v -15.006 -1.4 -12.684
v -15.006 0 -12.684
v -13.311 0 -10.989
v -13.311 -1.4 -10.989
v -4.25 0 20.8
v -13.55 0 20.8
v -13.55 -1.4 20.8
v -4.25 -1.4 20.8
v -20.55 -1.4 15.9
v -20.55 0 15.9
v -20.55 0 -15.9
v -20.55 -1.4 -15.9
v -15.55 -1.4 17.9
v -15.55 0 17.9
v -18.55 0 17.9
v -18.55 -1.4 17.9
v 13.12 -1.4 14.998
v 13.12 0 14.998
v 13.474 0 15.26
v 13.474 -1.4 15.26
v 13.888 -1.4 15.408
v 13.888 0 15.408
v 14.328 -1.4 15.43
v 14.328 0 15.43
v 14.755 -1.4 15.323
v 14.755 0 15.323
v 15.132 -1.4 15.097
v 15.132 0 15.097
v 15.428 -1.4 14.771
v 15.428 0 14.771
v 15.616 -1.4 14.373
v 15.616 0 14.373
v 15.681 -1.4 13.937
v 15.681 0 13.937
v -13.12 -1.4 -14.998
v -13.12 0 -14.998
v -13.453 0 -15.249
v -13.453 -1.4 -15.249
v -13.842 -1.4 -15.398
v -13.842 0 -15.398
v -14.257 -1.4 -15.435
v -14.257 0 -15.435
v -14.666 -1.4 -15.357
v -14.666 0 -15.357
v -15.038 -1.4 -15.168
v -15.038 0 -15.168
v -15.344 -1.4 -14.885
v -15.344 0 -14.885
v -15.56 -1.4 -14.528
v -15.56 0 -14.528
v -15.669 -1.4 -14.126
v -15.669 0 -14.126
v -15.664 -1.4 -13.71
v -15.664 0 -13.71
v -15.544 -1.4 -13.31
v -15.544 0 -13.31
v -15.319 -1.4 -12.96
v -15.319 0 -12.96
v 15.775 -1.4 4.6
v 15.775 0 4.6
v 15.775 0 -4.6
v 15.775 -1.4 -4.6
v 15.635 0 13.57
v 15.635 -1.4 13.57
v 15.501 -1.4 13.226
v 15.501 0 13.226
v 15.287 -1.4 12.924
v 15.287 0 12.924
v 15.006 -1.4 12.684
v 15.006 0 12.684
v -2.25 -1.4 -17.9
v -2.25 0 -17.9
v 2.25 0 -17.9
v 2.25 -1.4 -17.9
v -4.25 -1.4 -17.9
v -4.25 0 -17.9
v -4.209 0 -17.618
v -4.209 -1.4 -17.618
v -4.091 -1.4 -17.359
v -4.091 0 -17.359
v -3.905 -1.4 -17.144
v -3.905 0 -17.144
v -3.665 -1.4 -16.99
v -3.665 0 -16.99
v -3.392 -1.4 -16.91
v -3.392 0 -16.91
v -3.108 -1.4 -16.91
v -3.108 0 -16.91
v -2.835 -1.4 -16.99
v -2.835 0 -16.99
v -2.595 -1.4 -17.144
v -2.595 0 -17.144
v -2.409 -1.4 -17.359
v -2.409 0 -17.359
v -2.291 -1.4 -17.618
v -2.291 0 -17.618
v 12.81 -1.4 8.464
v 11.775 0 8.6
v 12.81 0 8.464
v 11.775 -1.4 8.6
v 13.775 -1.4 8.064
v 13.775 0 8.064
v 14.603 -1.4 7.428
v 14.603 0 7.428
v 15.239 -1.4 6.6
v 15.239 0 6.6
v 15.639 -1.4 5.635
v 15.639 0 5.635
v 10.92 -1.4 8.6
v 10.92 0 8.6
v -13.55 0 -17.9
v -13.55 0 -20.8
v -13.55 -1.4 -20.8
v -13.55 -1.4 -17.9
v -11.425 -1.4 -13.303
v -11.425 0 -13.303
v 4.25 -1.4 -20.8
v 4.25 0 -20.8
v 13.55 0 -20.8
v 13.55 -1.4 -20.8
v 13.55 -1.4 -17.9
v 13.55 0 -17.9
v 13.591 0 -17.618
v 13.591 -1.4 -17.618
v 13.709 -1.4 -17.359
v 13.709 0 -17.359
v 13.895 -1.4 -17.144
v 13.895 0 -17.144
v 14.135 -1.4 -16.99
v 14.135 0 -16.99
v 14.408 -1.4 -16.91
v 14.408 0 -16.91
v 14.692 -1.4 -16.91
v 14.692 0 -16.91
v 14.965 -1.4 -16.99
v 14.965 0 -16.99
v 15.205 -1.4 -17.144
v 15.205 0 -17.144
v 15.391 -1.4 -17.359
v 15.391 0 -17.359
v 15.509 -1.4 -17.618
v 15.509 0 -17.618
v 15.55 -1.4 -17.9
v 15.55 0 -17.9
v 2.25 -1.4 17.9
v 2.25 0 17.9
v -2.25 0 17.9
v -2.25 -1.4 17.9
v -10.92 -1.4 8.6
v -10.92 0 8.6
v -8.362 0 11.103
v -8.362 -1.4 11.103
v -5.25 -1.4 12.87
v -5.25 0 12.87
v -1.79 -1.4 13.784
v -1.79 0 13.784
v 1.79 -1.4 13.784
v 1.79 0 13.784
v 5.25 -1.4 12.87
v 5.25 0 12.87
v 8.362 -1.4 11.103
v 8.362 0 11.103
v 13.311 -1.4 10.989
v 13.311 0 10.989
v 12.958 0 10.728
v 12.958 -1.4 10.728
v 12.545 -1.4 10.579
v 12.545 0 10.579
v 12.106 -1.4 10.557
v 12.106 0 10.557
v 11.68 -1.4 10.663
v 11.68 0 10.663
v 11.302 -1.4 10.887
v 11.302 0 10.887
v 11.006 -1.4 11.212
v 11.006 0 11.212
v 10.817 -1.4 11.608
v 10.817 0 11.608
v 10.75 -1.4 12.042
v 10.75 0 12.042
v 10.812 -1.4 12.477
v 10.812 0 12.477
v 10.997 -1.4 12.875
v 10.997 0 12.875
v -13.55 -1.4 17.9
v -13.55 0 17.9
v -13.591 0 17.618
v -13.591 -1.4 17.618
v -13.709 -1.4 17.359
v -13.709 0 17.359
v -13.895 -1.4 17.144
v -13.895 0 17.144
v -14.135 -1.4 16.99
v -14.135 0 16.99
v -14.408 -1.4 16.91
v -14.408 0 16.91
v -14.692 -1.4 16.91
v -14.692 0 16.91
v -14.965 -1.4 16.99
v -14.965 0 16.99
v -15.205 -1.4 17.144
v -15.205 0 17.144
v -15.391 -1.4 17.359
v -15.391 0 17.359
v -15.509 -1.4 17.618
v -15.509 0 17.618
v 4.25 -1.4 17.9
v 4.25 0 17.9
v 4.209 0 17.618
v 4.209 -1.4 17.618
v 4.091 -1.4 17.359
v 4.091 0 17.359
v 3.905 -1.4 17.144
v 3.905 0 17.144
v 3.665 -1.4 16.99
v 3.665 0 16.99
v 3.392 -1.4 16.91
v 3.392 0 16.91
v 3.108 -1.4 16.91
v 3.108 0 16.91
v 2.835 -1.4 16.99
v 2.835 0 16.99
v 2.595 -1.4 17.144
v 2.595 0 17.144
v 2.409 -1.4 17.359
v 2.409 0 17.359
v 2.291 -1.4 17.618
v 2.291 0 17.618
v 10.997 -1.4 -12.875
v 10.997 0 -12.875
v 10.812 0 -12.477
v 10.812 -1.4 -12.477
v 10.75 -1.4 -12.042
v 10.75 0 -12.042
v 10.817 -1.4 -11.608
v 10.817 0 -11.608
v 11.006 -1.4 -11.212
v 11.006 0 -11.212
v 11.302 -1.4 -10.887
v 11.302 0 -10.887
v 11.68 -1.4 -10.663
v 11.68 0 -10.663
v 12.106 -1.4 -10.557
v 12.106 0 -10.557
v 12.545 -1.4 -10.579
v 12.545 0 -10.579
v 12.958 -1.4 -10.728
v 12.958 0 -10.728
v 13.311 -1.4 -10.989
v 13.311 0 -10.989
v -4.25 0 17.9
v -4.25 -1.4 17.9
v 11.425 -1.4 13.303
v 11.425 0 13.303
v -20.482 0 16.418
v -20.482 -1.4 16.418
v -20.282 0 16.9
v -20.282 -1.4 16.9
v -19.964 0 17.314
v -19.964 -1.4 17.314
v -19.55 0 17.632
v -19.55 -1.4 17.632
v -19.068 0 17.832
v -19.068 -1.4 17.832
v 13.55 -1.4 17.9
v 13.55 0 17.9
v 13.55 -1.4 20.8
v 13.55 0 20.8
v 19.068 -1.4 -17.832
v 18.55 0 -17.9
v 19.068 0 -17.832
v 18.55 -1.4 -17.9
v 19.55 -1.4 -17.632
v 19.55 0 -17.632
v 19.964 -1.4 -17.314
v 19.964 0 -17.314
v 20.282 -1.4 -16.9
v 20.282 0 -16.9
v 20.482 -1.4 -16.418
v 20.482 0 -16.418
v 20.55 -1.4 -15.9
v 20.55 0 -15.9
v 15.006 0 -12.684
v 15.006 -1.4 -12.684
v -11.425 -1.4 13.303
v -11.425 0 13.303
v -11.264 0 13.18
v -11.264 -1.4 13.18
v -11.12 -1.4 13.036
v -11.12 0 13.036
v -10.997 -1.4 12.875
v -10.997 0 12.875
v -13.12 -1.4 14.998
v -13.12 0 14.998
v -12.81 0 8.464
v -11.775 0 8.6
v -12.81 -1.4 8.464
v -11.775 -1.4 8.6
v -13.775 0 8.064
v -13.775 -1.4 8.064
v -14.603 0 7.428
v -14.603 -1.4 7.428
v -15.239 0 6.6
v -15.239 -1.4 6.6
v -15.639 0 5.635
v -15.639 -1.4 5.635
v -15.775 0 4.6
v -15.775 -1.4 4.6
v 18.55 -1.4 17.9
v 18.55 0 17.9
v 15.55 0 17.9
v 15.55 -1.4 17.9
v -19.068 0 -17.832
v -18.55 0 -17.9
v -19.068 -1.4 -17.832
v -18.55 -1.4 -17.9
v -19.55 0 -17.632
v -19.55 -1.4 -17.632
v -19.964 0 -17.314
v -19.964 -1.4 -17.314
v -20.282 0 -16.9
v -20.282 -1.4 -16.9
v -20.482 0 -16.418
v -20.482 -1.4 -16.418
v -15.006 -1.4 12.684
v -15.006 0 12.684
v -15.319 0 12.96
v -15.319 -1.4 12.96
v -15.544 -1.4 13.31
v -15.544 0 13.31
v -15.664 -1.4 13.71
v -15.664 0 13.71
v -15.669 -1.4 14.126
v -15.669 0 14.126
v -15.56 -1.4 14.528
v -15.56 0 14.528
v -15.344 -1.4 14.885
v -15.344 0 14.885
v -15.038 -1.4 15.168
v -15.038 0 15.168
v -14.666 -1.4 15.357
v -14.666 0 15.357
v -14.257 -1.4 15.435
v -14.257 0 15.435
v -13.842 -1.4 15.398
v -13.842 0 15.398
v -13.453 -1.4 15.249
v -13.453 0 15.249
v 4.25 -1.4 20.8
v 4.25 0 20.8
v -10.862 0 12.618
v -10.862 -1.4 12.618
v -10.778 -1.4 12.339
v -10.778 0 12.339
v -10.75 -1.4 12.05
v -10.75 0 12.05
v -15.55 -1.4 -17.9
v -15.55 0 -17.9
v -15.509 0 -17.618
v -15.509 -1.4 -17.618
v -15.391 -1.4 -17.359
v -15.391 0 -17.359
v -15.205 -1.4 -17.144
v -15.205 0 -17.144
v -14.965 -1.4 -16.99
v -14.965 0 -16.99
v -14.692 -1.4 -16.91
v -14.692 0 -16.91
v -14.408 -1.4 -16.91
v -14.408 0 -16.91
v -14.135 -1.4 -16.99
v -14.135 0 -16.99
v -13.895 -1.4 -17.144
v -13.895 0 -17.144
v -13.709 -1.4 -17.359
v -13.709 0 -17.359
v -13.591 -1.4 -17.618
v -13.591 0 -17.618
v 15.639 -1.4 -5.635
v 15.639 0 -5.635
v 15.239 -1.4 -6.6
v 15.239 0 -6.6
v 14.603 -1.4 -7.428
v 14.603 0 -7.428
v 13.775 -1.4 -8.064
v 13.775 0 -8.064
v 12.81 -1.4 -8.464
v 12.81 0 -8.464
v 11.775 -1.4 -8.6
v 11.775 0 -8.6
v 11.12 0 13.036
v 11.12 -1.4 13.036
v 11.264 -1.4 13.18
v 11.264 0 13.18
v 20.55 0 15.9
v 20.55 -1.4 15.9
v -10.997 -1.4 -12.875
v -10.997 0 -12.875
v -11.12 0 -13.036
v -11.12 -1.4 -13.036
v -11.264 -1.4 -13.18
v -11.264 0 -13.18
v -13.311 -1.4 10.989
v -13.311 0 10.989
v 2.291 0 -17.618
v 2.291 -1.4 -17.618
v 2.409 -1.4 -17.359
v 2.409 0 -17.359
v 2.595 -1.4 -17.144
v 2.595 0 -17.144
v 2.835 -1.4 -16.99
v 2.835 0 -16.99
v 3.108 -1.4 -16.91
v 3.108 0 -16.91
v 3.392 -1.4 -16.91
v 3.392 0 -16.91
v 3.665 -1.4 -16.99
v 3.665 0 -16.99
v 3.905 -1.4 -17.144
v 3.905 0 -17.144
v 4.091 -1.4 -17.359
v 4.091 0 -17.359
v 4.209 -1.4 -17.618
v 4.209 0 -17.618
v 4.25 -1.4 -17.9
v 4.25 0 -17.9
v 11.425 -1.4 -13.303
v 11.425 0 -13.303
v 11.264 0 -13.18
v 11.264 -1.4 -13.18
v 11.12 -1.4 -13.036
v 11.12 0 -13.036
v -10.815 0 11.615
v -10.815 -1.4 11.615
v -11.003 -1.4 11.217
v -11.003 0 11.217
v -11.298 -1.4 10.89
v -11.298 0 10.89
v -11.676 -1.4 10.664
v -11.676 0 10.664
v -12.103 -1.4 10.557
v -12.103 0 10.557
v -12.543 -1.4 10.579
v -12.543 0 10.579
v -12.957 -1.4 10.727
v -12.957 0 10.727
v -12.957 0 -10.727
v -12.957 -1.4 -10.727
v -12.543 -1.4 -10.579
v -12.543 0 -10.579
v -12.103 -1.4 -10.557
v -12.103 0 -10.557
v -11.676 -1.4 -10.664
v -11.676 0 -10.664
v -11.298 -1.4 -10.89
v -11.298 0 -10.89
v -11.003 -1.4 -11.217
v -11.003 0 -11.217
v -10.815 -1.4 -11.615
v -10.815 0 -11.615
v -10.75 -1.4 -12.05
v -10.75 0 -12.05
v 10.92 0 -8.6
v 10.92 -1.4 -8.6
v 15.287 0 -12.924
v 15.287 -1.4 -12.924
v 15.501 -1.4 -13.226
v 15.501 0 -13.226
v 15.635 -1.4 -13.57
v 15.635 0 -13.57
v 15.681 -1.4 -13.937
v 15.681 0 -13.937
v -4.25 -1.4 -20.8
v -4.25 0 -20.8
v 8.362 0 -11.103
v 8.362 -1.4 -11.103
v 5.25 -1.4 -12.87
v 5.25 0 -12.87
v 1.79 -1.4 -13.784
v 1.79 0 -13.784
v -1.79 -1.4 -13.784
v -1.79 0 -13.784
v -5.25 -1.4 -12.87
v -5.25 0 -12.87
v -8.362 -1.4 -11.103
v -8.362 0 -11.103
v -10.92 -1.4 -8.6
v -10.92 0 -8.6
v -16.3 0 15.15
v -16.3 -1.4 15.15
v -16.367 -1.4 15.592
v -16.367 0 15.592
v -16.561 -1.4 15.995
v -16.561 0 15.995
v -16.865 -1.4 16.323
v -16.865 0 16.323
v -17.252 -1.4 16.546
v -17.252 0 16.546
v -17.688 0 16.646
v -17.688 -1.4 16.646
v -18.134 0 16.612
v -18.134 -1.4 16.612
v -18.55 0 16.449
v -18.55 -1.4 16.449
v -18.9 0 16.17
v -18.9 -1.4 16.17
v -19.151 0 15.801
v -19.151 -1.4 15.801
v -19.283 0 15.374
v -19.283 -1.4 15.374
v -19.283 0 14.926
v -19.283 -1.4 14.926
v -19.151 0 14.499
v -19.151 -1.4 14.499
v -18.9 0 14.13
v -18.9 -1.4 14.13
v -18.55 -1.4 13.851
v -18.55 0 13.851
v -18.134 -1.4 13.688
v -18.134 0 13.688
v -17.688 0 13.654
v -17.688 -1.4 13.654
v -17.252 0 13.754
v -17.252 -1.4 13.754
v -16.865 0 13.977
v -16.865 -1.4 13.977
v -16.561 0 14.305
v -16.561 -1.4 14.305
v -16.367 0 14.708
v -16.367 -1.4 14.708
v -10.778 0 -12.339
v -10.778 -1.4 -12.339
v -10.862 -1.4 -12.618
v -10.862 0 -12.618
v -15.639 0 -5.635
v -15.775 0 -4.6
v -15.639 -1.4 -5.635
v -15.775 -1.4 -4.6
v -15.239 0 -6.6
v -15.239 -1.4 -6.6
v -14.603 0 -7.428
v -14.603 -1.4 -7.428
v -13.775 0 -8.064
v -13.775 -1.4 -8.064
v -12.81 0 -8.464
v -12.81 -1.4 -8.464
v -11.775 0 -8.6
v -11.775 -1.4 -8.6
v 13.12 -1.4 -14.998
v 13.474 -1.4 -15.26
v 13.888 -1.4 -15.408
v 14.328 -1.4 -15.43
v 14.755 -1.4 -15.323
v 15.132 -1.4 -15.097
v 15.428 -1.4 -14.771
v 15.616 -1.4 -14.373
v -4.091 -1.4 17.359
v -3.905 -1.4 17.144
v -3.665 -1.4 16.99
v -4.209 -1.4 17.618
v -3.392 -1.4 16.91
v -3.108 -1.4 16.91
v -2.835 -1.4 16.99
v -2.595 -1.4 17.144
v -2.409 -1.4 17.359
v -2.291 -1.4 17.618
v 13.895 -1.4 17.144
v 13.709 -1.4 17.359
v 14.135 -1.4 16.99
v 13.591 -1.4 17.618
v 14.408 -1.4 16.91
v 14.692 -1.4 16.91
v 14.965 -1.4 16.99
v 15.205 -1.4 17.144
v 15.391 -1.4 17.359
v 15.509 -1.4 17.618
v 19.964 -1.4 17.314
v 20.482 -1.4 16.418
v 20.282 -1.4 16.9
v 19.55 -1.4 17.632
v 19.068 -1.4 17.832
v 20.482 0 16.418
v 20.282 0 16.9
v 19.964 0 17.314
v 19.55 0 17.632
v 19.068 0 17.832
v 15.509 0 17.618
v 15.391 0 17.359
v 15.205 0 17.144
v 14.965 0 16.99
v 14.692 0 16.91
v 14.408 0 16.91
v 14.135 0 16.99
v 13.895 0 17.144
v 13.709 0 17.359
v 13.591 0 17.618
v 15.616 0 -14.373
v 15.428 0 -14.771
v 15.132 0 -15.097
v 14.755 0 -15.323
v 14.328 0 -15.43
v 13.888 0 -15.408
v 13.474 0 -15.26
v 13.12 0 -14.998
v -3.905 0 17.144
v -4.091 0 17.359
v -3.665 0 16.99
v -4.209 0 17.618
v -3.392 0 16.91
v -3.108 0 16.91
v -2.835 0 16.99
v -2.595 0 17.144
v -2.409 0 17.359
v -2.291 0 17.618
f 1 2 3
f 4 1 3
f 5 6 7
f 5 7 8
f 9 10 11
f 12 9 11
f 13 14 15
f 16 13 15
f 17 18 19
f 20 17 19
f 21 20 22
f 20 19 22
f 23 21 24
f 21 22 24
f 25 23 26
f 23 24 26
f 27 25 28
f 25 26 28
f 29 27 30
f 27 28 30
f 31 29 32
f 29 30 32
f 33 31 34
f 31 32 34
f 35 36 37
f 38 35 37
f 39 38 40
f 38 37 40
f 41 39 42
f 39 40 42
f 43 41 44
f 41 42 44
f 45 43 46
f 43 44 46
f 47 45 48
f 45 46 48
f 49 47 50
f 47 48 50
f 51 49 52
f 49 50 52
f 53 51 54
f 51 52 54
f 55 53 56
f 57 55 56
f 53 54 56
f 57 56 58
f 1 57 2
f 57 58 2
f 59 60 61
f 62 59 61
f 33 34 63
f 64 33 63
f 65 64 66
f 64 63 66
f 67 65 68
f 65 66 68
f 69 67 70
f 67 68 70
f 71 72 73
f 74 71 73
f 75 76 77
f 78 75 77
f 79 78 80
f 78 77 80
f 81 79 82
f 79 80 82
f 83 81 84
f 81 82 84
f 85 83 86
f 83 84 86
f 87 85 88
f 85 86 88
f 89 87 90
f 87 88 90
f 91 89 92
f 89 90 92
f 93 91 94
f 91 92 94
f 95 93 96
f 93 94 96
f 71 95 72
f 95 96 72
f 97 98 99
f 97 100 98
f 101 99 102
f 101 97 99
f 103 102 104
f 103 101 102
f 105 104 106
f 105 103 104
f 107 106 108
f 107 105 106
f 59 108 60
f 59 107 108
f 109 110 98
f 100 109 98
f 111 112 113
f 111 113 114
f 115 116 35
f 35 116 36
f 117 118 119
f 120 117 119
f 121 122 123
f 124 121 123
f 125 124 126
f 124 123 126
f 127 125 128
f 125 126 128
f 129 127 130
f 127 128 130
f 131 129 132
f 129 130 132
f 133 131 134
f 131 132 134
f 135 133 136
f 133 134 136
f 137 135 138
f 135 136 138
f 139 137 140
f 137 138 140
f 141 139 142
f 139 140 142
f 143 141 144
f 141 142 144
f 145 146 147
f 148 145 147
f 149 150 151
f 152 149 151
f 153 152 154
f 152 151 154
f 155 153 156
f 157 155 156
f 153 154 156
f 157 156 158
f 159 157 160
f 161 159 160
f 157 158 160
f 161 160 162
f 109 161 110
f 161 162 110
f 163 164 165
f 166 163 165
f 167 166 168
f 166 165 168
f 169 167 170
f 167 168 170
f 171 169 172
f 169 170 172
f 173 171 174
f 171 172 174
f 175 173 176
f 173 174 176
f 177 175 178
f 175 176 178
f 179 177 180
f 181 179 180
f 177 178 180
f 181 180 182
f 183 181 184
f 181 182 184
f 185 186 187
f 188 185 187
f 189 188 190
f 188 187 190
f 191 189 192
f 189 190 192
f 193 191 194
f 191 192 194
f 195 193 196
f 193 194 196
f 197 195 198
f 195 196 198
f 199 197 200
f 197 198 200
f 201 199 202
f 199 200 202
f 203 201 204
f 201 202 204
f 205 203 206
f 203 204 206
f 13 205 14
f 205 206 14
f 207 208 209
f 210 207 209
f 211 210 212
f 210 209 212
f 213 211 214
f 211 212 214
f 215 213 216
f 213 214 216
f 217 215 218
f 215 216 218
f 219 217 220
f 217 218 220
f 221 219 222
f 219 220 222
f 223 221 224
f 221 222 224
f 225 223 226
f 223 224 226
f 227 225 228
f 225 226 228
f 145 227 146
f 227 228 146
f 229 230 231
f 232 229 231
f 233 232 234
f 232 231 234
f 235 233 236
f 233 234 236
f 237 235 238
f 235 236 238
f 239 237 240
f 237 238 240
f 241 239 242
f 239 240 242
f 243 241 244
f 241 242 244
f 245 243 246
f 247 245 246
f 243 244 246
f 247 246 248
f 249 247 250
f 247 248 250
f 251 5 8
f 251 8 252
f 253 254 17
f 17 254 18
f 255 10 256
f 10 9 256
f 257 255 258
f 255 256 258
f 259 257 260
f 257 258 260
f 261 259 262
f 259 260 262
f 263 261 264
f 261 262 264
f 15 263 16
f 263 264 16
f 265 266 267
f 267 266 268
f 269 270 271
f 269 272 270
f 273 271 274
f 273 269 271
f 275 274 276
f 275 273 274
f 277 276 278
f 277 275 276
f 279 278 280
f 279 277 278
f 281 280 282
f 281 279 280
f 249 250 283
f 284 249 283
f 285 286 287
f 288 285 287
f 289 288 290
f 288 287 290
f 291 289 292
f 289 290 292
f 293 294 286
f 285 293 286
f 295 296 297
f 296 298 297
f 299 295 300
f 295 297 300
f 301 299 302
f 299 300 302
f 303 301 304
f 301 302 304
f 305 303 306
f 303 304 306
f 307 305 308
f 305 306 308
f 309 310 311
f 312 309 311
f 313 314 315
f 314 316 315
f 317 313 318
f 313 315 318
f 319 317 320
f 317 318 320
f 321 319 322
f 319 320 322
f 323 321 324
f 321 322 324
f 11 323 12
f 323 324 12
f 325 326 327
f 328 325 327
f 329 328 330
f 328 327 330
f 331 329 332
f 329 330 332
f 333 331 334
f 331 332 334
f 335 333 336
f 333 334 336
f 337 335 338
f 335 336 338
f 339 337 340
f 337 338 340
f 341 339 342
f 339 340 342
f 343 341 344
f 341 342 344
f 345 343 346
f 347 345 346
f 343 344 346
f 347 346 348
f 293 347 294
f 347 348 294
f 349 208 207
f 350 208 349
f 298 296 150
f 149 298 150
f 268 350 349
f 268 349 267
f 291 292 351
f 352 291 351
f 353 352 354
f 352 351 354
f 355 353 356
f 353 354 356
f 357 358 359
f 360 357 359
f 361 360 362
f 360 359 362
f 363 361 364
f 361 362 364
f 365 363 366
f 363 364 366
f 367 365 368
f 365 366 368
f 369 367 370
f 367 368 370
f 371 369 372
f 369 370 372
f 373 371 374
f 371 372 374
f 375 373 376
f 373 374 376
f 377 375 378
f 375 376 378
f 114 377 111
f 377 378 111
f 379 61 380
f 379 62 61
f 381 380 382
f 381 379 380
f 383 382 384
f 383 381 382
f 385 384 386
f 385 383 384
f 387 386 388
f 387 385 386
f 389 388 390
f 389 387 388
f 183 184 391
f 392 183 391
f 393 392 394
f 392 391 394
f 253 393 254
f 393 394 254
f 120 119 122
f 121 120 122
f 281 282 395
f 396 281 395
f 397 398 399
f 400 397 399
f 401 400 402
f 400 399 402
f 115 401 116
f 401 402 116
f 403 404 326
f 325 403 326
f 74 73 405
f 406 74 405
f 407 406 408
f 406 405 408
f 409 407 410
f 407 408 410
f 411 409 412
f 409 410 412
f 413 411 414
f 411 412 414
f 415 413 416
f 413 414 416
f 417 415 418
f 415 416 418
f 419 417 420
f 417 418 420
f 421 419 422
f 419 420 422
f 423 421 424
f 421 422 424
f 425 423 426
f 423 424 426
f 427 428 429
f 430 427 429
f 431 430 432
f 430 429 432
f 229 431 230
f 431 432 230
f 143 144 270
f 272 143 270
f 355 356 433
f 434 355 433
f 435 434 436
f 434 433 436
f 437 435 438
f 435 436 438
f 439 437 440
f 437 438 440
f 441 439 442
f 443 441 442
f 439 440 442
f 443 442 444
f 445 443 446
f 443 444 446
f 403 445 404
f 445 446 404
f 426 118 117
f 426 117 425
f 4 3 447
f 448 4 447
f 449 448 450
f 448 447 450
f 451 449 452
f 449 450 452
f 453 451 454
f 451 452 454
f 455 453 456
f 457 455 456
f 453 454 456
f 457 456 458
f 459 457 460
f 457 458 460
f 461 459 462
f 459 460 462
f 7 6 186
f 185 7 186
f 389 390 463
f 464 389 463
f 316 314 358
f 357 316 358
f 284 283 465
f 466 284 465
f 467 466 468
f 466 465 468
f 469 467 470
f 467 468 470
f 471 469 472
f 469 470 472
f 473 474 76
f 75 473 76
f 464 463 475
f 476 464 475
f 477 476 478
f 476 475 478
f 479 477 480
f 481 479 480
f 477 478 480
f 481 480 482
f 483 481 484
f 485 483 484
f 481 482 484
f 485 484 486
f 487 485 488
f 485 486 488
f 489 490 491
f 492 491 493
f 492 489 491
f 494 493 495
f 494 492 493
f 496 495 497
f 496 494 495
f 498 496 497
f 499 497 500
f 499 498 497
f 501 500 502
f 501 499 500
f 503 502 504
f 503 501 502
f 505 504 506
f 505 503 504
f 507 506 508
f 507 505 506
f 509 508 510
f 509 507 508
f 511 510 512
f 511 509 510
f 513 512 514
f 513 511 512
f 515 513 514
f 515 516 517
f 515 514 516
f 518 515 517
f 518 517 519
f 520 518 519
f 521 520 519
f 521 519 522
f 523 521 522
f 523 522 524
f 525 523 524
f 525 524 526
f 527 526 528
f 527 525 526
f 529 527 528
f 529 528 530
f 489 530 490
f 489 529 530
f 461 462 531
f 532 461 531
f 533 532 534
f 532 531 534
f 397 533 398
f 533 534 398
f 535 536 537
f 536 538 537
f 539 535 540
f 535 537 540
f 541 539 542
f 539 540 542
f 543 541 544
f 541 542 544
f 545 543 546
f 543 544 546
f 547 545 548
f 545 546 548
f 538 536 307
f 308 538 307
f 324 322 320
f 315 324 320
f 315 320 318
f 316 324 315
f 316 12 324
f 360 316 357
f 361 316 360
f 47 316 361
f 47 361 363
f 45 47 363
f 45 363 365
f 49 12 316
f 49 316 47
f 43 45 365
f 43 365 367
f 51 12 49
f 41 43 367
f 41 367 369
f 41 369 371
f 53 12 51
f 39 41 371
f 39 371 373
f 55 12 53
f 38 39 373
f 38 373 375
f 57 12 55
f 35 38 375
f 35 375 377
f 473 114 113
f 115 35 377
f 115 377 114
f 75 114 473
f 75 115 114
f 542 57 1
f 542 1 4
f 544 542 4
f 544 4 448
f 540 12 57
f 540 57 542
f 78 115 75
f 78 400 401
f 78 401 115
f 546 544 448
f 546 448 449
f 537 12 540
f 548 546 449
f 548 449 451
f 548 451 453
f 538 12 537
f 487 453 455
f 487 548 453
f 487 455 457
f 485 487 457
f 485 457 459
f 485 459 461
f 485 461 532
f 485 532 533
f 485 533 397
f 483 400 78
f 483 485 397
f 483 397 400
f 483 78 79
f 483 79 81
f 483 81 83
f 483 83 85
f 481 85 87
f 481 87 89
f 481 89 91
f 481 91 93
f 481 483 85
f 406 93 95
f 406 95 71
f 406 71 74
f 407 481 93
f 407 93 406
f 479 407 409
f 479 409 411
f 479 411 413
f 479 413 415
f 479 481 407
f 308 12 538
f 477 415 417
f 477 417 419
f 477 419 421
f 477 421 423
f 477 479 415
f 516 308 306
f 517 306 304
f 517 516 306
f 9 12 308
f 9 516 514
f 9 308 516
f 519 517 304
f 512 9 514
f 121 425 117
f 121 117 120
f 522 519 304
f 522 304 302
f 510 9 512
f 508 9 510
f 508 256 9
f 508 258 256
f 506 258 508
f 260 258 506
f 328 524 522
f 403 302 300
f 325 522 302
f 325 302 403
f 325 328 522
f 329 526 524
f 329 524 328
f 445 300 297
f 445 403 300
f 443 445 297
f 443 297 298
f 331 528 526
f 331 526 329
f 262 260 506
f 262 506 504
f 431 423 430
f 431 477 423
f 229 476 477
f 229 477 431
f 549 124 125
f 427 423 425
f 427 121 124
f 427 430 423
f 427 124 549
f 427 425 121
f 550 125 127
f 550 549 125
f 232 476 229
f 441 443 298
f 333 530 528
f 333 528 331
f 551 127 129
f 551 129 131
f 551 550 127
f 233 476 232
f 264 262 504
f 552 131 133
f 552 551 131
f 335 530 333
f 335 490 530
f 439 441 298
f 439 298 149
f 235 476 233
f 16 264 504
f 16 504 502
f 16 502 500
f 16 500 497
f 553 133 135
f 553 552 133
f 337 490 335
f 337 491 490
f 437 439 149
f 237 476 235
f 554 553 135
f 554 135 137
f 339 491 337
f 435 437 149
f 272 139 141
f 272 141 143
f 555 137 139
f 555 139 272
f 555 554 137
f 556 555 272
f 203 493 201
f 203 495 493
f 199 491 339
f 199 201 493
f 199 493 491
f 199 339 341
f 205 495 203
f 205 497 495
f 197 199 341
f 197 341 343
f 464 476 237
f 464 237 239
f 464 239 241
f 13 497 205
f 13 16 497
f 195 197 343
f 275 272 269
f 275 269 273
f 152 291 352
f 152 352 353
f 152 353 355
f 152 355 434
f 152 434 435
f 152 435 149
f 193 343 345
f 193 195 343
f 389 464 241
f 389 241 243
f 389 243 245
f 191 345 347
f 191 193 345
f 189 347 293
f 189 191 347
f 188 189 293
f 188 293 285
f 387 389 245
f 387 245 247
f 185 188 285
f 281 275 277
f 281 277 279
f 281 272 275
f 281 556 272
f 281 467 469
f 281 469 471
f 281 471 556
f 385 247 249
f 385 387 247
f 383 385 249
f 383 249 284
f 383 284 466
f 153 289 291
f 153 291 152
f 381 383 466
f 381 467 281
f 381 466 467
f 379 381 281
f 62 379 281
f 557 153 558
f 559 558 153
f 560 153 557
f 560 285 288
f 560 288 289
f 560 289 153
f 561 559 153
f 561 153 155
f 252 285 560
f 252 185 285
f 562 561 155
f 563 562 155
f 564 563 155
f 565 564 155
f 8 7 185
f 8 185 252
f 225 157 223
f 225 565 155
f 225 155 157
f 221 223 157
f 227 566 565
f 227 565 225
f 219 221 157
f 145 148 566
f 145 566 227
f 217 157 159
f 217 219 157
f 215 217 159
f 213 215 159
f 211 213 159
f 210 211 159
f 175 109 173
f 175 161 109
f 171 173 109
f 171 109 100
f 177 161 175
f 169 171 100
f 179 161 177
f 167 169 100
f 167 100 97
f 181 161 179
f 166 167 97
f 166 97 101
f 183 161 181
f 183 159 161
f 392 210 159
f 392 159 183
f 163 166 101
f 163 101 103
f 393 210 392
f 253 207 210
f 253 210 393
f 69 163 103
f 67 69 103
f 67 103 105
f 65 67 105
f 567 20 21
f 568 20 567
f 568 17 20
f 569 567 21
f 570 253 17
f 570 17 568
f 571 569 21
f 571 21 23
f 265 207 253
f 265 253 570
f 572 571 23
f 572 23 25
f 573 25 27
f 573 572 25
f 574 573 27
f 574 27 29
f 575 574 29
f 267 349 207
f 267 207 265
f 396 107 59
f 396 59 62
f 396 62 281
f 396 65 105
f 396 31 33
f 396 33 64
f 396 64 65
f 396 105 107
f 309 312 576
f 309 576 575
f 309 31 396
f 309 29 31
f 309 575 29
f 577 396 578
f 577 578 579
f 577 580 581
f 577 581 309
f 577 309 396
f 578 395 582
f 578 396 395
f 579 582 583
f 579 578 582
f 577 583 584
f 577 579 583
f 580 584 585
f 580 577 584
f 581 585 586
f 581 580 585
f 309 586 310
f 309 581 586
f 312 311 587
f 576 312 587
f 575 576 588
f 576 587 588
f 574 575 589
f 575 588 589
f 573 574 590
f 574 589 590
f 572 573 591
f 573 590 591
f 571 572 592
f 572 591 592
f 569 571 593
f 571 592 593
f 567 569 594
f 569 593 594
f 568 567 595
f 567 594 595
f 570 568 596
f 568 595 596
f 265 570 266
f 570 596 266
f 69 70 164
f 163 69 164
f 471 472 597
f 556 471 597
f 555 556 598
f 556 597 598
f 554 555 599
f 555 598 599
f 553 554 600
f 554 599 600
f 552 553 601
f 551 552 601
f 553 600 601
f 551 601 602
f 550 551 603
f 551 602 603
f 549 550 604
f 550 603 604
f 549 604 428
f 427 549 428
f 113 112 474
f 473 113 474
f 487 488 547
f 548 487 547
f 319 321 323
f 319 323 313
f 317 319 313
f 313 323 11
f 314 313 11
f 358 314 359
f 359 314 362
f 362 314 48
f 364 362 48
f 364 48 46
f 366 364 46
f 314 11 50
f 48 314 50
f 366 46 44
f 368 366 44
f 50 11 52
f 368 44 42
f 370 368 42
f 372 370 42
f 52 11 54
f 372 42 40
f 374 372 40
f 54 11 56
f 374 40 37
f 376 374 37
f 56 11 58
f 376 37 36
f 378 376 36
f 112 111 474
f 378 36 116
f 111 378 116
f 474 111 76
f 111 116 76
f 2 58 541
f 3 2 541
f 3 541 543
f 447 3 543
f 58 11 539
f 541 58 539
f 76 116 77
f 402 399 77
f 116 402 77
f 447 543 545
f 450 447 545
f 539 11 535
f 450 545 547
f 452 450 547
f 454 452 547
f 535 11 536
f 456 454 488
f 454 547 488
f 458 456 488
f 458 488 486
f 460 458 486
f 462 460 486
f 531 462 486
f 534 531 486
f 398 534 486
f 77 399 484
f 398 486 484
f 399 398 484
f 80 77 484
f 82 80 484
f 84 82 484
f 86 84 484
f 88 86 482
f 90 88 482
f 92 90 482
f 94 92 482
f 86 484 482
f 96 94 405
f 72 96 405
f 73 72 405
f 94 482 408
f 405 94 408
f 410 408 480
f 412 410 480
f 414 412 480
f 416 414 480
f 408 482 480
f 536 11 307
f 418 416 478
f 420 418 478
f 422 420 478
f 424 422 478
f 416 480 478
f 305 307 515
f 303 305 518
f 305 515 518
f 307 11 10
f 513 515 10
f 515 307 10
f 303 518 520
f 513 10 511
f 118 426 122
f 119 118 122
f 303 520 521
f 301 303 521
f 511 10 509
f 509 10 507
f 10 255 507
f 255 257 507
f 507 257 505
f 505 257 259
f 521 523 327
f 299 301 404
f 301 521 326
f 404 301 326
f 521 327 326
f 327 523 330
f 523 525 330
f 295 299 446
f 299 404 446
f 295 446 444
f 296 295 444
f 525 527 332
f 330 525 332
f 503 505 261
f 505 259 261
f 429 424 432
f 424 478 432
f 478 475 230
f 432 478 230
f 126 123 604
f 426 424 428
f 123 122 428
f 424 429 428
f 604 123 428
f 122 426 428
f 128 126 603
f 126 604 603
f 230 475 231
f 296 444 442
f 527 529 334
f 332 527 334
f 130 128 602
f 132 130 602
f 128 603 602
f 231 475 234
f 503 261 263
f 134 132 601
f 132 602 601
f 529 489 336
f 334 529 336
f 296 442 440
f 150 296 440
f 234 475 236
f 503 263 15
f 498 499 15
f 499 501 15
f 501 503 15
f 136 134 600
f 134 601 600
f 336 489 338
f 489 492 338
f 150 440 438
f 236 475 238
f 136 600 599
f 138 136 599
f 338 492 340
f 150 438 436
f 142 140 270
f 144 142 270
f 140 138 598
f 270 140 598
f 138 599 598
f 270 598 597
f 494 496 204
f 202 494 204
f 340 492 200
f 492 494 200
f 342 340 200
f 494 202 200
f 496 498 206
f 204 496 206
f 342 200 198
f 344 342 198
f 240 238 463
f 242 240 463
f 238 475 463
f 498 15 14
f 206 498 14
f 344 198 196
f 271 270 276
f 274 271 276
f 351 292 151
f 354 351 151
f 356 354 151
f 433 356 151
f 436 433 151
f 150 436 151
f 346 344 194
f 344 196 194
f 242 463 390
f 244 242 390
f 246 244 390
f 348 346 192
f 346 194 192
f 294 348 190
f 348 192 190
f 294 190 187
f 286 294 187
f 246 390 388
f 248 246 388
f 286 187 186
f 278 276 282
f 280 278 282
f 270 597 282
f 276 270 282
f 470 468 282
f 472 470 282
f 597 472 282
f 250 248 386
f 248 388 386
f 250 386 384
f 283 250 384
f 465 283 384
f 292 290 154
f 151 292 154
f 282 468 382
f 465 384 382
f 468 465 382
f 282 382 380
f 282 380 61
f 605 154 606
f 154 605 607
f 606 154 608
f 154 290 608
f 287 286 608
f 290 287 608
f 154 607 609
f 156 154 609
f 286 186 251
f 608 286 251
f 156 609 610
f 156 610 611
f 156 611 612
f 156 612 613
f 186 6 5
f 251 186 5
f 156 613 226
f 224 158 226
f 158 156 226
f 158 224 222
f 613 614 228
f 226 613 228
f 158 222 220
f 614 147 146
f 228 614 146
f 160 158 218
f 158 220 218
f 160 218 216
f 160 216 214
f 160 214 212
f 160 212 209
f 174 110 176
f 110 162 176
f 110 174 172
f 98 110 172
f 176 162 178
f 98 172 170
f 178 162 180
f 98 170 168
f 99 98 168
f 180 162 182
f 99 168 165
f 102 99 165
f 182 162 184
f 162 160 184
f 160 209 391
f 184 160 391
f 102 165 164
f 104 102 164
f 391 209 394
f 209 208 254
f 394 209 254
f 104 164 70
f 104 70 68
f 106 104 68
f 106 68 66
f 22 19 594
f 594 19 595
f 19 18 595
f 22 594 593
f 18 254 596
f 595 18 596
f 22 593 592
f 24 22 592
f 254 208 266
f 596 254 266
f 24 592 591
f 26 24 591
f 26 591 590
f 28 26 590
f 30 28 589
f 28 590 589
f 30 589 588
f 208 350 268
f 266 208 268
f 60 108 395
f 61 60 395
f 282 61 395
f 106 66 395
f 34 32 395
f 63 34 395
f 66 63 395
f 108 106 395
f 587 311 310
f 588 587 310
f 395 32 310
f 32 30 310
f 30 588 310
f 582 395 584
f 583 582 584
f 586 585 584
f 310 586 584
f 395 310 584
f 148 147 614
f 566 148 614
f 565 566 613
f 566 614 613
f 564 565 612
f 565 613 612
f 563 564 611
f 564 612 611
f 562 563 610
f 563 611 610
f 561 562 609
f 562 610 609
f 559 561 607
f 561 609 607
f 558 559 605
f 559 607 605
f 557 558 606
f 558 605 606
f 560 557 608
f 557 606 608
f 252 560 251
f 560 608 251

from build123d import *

# Parameters (mm, degrees)
F0_R     = 1.5
F0_W     = 9.3
F0_H     = 2.9
F1_DEPTH = 1.4
F2_R     = 4
F3_DEPTH = 2
F4_R     = 2


# Not quite as in the source:
# - a pattern or mirror of a feature is missing from the dataset's text; its kind, count and spacing are read off the source's solid
# - a feature names something its author has since deleted; it is built from what else it names


with BuildPart() as f1:
    # F0 (on Front) → F1 (new body)
    with BuildSketch(Plane.XZ):
        with BuildLine():
            Line((15.55, -17.9), (20.55, -17.9))
            Line((20.55, -17.9), (20.55, 17.9))
            Line((20.55, 17.9), (15.55, 17.9))
            ThreePointArc((15.55, 17.9), (14.55, 16.9), (13.55, 17.9))
            Line((13.55, 17.9), (4.25, 17.9))
            ThreePointArc((4.25, 17.9), (3.25, 16.9), (2.25, 17.9))
            Line((2.25, 17.9), (-2.25, 17.9))
            ThreePointArc((-2.25, 17.9), (-3.25, 16.9), (-4.25, 17.9))
            Line((-4.25, 17.9), (-13.55, 17.9))
            ThreePointArc((-13.55, 17.9), (-14.55, 16.9), (-15.55, 17.9))
            Line((-15.55, 17.9), (-20.55, 17.9))
            Line((-20.55, 17.9), (-20.55, -17.9))
            Line((-20.55, -17.9), (-15.55, -17.9))
            ThreePointArc((-15.55, -17.9), (-14.55, -16.9), (-13.55, -17.9))
            Line((-13.55, -17.9), (-4.25, -17.9))
            ThreePointArc((-4.25, -17.9), (-3.25, -16.9), (-2.25, -17.9))
            Line((-2.25, -17.9), (2.25, -17.9))
            ThreePointArc((2.25, -17.9), (3.25, -16.9), (4.25, -17.9))
            Line((4.25, -17.9), (13.55, -17.9))
            ThreePointArc((13.55, -17.9), (14.55, -16.9), (15.55, -17.9))
        make_face()
        with BuildLine():
            ThreePointArc((-13.1202274148, -14.9978997242), (-15.343659863, -14.8848474001), (-15.0056689733, -12.6843486297))
            Line((-15.0056689733, -12.6843486297), (-13.3106601718, -10.9893398282))
            ThreePointArc((-13.3106601718, -10.9893398282), (-11.6759748515, -10.6641807012), (-10.75, -12.05))
            ThreePointArc((-10.75, -12.05), (-10.8131046691, -12.4805018095), (-10.9971090773, -12.8747813867))
            ThreePointArc((-10.9971090773, -12.8747813867), (-11.1893398282, -13.1106601718), (-11.4252186133, -13.3028909227))
            Line((-11.4252186133, -13.3028909227), (-13.1202274148, -14.9978997242))
        make_face(mode=Mode.SUBTRACT)
        with BuildLine():
            Line((13.3106601718, -10.9893398282), (15.0056689733, -12.6843486297))
            ThreePointArc((15.0056689733, -12.6843486297), (15.5013367677, -13.2256118689), (15.6808875866, -13.9372395524))
            ThreePointArc((15.6808875866, -13.9372395524), (14.7549127351, -15.3230588512), (13.1202274148, -14.9978997242))
            Line((13.1202274148, -14.9978997242), (11.4252186133, -13.3028909227))
            ThreePointArc((11.4252186133, -13.3028909227), (11.1893398282, -13.1106601718), (10.9971090773, -12.8747813867))
            ThreePointArc((10.9971090773, -12.8747813867), (11.3023921523, -10.8872277235), (13.3106601718, -10.9893398282))
        make_face(mode=Mode.SUBTRACT)
        with Locations((-17.8, 15.15)):
            Circle(F0_R, mode=Mode.SUBTRACT)
        with BuildLine():
            ThreePointArc((-15.0056689733, 12.6843486297), (-15.343659863, 14.8848474001), (-13.1202274148, 14.9978997242))
            Line((-13.1202274148, 14.9978997242), (-11.4252186133, 13.3028909227))
            ThreePointArc((-11.4252186133, 13.3028909227), (-11.1893398282, 13.1106601718), (-10.9971090773, 12.8747813867))
            ThreePointArc((-10.9971090773, 12.8747813867), (-10.8131046691, 12.4805018095), (-10.75, 12.05))
            ThreePointArc((-10.75, 12.05), (-11.6759748515, 10.6641807012), (-13.3106601718, 10.9893398282))
            Line((-13.3106601718, 10.9893398282), (-15.0056689733, 12.6843486297))
        make_face(mode=Mode.SUBTRACT)
        with BuildLine():
            ThreePointArc((-10.9201648339, 8.6), (0, 13.9), (10.9201648339, 8.6))
            Line((10.9201648339, 8.6), (15.775, 8.6))
            Line((15.775, 8.6), (15.775, -8.6))
            Line((15.775, -8.6), (10.9201648339, -8.6))
            ThreePointArc((10.9201648339, -8.6), (0, -13.9), (-10.9201648339, -8.6))
            Line((-10.9201648339, -8.6), (-15.775, -8.6))
            Line((-15.775, -8.6), (-15.775, 8.6))
            Line((-15.775, 8.6), (-10.9201648339, 8.6))
        make_face(mode=Mode.SUBTRACT)
        with BuildLine():
            ThreePointArc((13.1202274148, 14.9978997242), (14.7549127351, 15.3230588512), (15.6808875866, 13.9372395524))
            ThreePointArc((15.6808875866, 13.9372395524), (15.5013367677, 13.2256118689), (15.0056689733, 12.6843486297))
            Line((15.0056689733, 12.6843486297), (13.3106601718, 10.9893398282))
            ThreePointArc((13.3106601718, 10.9893398282), (11.3023921523, 10.8872277235), (10.9971090773, 12.8747813867))
            ThreePointArc((10.9971090773, 12.8747813867), (11.1893398282, 13.1106601718), (11.4252186133, 13.3028909227))
            Line((11.4252186133, 13.3028909227), (13.1202274148, 14.9978997242))
        make_face(mode=Mode.SUBTRACT)
        with Locations((-8.9, -19.35)):
            Rectangle(F0_W, F0_H)
        with Locations((8.9, -19.35)):
            Rectangle(F0_W, F0_H)
        with Locations((8.9, 19.35)):
            Rectangle(F0_W, F0_H)
    extrude(amount=F1_DEPTH)

    # F1_copies: F1 across plane


with BuildPart() as f1_1:
    add(f1.part)
    add(f1.part.mirror(Plane.XY))

    # F2
    f2_edges = [f1_1.edges().sort_by_distance(p)[0] for p in [
        (-15.775, -0.7, 8.6),
        (-15.775, -0.7, -8.6),
        (15.775, -0.7, 8.6),
        (15.775, -0.7, -8.6),
    ]]
    fillet(f2_edges, radius=F2_R)

    # F0 (on Front) → F3 (cut)
    with BuildSketch(Plane.XZ):
        with BuildLine():
            ThreePointArc((-4.25, 17.9), (-3.25, 16.9), (-2.25, 17.9))
            Line((-2.25, 17.9), (-4.25, 17.9))
        make_face()
        with BuildLine():
            Line((-4.25, 17.9), (-2.25, 17.9))
            ThreePointArc((-2.25, 17.9), (-3.25, 18.9), (-4.25, 17.9))
        make_face()
        with Locations((-17.8, 15.15)):
            Circle(F0_R)
    extrude(amount=F3_DEPTH, mode=Mode.SUBTRACT)

    # F4
    f4_edges = [f1_1.edges().sort_by_distance(p)[0] for p in [
        (-20.55, -0.7, 17.9),
        (20.55, -0.7, 17.9),
        (20.55, -0.7, -17.9),
        (-20.55, -0.7, -17.9),
    ]]
    fillet(f4_edges, radius=F4_R)


solid = f1_1.part
